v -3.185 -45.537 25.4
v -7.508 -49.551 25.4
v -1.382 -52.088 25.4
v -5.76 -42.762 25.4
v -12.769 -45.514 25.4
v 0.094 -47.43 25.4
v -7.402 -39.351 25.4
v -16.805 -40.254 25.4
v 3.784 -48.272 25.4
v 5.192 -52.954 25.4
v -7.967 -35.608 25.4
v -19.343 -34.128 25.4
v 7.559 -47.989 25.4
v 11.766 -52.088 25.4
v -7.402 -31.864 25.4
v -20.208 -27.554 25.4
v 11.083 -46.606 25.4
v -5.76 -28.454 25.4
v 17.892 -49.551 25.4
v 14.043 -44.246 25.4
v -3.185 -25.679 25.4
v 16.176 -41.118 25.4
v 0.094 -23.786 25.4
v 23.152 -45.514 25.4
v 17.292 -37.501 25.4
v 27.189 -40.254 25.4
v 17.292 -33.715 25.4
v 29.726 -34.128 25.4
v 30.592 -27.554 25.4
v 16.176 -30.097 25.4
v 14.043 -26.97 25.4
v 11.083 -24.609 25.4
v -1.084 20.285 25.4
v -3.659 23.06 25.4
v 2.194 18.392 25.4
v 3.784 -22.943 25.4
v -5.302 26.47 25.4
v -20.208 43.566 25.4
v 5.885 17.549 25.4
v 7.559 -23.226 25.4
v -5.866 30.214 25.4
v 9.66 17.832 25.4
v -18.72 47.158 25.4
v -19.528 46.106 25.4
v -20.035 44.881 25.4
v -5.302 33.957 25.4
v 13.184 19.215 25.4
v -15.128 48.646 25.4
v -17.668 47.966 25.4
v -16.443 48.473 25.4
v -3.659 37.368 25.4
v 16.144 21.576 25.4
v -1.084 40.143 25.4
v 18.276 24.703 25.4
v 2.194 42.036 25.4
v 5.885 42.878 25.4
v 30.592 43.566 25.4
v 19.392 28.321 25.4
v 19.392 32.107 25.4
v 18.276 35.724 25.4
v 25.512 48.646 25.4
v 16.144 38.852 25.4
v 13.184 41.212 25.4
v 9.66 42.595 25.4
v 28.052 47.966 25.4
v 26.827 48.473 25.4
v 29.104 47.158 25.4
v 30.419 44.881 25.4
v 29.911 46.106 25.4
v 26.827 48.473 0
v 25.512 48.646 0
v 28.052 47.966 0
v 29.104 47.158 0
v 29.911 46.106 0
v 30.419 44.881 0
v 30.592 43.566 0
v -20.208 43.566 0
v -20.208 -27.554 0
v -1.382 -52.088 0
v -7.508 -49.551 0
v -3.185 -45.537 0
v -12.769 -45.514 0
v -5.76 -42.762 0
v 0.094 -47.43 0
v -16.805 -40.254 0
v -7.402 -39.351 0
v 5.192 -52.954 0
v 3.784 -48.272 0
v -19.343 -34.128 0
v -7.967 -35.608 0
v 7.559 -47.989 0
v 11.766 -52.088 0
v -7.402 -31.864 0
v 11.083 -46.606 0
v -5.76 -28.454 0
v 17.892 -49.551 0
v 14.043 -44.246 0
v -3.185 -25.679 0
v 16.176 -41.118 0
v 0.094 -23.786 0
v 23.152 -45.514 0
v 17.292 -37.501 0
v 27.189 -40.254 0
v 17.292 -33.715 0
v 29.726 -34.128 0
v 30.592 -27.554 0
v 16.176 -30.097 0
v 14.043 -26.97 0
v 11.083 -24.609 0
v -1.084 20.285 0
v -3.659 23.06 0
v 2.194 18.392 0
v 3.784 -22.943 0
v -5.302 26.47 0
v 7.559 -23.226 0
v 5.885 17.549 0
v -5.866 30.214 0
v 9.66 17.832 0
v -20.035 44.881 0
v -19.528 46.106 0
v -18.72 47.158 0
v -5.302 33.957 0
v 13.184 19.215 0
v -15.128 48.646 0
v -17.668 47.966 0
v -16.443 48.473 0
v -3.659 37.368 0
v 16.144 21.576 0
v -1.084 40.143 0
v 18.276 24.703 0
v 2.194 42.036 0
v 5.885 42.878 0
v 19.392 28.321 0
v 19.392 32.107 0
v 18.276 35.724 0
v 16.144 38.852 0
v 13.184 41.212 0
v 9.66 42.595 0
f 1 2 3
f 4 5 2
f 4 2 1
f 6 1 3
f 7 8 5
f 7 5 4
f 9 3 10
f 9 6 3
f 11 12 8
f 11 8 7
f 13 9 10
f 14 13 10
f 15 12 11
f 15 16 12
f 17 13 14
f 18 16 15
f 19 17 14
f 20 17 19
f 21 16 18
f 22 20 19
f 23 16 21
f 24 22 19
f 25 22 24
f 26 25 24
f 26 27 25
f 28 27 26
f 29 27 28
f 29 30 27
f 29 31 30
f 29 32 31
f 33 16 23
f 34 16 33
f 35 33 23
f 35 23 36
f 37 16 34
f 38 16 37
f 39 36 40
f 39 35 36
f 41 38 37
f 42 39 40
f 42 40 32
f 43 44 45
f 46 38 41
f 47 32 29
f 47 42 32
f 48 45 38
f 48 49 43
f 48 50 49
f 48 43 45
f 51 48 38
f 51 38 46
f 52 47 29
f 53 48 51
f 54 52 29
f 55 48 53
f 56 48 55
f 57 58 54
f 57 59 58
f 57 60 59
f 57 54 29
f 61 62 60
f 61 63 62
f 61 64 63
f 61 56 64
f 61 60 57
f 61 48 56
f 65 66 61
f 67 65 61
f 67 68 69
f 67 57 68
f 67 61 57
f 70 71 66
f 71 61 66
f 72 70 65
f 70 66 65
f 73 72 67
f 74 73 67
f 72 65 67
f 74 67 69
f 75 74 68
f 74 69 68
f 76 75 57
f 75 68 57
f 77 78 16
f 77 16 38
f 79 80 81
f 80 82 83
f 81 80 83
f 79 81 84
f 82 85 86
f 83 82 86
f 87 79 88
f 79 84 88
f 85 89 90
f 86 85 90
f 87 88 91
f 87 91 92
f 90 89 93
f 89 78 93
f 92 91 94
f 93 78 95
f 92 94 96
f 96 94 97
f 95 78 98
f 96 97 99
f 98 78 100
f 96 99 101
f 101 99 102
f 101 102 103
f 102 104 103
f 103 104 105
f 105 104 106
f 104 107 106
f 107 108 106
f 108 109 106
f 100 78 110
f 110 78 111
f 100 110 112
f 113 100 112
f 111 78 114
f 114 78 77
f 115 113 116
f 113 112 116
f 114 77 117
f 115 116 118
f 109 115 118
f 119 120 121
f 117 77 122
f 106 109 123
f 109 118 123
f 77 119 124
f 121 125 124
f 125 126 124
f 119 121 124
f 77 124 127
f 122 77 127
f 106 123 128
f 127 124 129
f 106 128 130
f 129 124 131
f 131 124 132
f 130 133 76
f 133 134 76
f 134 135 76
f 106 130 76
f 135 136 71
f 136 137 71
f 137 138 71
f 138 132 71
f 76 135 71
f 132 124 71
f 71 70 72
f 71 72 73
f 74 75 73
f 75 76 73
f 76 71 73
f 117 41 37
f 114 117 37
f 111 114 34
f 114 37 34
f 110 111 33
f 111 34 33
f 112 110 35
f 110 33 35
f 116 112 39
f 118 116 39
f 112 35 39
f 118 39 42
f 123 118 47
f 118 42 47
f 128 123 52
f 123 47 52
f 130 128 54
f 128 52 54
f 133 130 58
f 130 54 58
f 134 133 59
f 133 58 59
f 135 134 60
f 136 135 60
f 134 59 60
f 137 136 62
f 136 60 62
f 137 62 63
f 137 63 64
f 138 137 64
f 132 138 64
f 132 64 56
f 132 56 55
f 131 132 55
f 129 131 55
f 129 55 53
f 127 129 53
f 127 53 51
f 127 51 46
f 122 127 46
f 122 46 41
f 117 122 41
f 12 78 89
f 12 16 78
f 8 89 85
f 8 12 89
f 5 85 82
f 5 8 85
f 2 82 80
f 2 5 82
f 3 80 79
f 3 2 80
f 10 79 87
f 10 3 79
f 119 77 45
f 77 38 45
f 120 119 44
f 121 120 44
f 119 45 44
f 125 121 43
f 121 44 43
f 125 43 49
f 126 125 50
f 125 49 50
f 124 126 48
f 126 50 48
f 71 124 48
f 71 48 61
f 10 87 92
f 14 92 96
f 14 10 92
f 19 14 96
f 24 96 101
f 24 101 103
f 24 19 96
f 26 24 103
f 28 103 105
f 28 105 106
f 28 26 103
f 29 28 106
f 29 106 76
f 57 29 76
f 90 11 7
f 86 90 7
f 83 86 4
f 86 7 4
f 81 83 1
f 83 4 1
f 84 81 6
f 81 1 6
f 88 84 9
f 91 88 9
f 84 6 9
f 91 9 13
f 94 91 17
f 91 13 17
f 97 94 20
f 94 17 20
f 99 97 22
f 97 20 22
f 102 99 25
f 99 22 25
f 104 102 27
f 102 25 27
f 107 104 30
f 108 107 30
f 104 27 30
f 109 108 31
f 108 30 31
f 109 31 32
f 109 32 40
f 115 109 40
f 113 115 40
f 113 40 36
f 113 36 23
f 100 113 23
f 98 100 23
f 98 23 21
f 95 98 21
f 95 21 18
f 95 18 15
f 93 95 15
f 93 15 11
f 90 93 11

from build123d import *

# Parameters (mm, degrees)
F0_W     = 50.8
F0_H     = 101.6
F1_DEPTH = 25.4
F2_R     = 12.7
F3_DEPTH = 131
F4_D     = 25.4
F6_D     = 25.4
F7_R     = 25.39999
F8_R     = 5.08


# Not quite as in the source:
# - a fillet or chamfer is up to 0.001 mm smaller than in the source, because OpenCascade refuses the exact size
# - an extrude ends at something that could not be found from the text; its depth is read off the source's solid


with BuildPart() as f1:
    # F0 (on Top) → F1 (new body)
    with BuildSketch(Plane.XY):
        with Locations((5.1918309937, -2.1536122621)):
            Rectangle(F0_W, F0_H)
    extrude(amount=F1_DEPTH)

    # F2 (on Top) → F3 (cut, through all)
    with BuildSketch(Plane.XY):
        with Locations((4.7334181145, -35.6077803201)):
            Circle(F2_R)
    extrude(amount=-F3_DEPTH, mode=Mode.SUBTRACT)

    # F4 (through all)
    with Locations(Plane(origin=(0, 0, 0), x_dir=(1, 0, 0), z_dir=(0, 0, -1))):
        with Locations((4.7334181145, 35.6077803201)):
            Hole(F4_D / 2)

    # F6 (through all)
    with Locations(Plane(origin=(0, 0, 0), x_dir=(1, 0, 0), z_dir=(0, 0, -1))):
        with Locations((6.8339584395, -30.2138105035)):
            Hole(F6_D / 2)

    # F7 (radius 25.4 in the source; OpenCascade refuses exactly that, so slightly less here)
    f7_edges = [f1.edges().sort_by_distance(p)[0] for p in [
        (-20.208169, -52.953612, 12.7),
        (30.591831, -52.953612, 12.7),
    ]]
    fillet(f7_edges, radius=F7_R)

    # F8
    f8_edges = [f1.edges().sort_by_distance(p)[0] for p in [
        (-20.208169, 48.646388, 12.7),
        (30.591831, 48.646388, 12.7),
    ]]
    fillet(f8_edges, radius=F8_R)


solid = f1.part
